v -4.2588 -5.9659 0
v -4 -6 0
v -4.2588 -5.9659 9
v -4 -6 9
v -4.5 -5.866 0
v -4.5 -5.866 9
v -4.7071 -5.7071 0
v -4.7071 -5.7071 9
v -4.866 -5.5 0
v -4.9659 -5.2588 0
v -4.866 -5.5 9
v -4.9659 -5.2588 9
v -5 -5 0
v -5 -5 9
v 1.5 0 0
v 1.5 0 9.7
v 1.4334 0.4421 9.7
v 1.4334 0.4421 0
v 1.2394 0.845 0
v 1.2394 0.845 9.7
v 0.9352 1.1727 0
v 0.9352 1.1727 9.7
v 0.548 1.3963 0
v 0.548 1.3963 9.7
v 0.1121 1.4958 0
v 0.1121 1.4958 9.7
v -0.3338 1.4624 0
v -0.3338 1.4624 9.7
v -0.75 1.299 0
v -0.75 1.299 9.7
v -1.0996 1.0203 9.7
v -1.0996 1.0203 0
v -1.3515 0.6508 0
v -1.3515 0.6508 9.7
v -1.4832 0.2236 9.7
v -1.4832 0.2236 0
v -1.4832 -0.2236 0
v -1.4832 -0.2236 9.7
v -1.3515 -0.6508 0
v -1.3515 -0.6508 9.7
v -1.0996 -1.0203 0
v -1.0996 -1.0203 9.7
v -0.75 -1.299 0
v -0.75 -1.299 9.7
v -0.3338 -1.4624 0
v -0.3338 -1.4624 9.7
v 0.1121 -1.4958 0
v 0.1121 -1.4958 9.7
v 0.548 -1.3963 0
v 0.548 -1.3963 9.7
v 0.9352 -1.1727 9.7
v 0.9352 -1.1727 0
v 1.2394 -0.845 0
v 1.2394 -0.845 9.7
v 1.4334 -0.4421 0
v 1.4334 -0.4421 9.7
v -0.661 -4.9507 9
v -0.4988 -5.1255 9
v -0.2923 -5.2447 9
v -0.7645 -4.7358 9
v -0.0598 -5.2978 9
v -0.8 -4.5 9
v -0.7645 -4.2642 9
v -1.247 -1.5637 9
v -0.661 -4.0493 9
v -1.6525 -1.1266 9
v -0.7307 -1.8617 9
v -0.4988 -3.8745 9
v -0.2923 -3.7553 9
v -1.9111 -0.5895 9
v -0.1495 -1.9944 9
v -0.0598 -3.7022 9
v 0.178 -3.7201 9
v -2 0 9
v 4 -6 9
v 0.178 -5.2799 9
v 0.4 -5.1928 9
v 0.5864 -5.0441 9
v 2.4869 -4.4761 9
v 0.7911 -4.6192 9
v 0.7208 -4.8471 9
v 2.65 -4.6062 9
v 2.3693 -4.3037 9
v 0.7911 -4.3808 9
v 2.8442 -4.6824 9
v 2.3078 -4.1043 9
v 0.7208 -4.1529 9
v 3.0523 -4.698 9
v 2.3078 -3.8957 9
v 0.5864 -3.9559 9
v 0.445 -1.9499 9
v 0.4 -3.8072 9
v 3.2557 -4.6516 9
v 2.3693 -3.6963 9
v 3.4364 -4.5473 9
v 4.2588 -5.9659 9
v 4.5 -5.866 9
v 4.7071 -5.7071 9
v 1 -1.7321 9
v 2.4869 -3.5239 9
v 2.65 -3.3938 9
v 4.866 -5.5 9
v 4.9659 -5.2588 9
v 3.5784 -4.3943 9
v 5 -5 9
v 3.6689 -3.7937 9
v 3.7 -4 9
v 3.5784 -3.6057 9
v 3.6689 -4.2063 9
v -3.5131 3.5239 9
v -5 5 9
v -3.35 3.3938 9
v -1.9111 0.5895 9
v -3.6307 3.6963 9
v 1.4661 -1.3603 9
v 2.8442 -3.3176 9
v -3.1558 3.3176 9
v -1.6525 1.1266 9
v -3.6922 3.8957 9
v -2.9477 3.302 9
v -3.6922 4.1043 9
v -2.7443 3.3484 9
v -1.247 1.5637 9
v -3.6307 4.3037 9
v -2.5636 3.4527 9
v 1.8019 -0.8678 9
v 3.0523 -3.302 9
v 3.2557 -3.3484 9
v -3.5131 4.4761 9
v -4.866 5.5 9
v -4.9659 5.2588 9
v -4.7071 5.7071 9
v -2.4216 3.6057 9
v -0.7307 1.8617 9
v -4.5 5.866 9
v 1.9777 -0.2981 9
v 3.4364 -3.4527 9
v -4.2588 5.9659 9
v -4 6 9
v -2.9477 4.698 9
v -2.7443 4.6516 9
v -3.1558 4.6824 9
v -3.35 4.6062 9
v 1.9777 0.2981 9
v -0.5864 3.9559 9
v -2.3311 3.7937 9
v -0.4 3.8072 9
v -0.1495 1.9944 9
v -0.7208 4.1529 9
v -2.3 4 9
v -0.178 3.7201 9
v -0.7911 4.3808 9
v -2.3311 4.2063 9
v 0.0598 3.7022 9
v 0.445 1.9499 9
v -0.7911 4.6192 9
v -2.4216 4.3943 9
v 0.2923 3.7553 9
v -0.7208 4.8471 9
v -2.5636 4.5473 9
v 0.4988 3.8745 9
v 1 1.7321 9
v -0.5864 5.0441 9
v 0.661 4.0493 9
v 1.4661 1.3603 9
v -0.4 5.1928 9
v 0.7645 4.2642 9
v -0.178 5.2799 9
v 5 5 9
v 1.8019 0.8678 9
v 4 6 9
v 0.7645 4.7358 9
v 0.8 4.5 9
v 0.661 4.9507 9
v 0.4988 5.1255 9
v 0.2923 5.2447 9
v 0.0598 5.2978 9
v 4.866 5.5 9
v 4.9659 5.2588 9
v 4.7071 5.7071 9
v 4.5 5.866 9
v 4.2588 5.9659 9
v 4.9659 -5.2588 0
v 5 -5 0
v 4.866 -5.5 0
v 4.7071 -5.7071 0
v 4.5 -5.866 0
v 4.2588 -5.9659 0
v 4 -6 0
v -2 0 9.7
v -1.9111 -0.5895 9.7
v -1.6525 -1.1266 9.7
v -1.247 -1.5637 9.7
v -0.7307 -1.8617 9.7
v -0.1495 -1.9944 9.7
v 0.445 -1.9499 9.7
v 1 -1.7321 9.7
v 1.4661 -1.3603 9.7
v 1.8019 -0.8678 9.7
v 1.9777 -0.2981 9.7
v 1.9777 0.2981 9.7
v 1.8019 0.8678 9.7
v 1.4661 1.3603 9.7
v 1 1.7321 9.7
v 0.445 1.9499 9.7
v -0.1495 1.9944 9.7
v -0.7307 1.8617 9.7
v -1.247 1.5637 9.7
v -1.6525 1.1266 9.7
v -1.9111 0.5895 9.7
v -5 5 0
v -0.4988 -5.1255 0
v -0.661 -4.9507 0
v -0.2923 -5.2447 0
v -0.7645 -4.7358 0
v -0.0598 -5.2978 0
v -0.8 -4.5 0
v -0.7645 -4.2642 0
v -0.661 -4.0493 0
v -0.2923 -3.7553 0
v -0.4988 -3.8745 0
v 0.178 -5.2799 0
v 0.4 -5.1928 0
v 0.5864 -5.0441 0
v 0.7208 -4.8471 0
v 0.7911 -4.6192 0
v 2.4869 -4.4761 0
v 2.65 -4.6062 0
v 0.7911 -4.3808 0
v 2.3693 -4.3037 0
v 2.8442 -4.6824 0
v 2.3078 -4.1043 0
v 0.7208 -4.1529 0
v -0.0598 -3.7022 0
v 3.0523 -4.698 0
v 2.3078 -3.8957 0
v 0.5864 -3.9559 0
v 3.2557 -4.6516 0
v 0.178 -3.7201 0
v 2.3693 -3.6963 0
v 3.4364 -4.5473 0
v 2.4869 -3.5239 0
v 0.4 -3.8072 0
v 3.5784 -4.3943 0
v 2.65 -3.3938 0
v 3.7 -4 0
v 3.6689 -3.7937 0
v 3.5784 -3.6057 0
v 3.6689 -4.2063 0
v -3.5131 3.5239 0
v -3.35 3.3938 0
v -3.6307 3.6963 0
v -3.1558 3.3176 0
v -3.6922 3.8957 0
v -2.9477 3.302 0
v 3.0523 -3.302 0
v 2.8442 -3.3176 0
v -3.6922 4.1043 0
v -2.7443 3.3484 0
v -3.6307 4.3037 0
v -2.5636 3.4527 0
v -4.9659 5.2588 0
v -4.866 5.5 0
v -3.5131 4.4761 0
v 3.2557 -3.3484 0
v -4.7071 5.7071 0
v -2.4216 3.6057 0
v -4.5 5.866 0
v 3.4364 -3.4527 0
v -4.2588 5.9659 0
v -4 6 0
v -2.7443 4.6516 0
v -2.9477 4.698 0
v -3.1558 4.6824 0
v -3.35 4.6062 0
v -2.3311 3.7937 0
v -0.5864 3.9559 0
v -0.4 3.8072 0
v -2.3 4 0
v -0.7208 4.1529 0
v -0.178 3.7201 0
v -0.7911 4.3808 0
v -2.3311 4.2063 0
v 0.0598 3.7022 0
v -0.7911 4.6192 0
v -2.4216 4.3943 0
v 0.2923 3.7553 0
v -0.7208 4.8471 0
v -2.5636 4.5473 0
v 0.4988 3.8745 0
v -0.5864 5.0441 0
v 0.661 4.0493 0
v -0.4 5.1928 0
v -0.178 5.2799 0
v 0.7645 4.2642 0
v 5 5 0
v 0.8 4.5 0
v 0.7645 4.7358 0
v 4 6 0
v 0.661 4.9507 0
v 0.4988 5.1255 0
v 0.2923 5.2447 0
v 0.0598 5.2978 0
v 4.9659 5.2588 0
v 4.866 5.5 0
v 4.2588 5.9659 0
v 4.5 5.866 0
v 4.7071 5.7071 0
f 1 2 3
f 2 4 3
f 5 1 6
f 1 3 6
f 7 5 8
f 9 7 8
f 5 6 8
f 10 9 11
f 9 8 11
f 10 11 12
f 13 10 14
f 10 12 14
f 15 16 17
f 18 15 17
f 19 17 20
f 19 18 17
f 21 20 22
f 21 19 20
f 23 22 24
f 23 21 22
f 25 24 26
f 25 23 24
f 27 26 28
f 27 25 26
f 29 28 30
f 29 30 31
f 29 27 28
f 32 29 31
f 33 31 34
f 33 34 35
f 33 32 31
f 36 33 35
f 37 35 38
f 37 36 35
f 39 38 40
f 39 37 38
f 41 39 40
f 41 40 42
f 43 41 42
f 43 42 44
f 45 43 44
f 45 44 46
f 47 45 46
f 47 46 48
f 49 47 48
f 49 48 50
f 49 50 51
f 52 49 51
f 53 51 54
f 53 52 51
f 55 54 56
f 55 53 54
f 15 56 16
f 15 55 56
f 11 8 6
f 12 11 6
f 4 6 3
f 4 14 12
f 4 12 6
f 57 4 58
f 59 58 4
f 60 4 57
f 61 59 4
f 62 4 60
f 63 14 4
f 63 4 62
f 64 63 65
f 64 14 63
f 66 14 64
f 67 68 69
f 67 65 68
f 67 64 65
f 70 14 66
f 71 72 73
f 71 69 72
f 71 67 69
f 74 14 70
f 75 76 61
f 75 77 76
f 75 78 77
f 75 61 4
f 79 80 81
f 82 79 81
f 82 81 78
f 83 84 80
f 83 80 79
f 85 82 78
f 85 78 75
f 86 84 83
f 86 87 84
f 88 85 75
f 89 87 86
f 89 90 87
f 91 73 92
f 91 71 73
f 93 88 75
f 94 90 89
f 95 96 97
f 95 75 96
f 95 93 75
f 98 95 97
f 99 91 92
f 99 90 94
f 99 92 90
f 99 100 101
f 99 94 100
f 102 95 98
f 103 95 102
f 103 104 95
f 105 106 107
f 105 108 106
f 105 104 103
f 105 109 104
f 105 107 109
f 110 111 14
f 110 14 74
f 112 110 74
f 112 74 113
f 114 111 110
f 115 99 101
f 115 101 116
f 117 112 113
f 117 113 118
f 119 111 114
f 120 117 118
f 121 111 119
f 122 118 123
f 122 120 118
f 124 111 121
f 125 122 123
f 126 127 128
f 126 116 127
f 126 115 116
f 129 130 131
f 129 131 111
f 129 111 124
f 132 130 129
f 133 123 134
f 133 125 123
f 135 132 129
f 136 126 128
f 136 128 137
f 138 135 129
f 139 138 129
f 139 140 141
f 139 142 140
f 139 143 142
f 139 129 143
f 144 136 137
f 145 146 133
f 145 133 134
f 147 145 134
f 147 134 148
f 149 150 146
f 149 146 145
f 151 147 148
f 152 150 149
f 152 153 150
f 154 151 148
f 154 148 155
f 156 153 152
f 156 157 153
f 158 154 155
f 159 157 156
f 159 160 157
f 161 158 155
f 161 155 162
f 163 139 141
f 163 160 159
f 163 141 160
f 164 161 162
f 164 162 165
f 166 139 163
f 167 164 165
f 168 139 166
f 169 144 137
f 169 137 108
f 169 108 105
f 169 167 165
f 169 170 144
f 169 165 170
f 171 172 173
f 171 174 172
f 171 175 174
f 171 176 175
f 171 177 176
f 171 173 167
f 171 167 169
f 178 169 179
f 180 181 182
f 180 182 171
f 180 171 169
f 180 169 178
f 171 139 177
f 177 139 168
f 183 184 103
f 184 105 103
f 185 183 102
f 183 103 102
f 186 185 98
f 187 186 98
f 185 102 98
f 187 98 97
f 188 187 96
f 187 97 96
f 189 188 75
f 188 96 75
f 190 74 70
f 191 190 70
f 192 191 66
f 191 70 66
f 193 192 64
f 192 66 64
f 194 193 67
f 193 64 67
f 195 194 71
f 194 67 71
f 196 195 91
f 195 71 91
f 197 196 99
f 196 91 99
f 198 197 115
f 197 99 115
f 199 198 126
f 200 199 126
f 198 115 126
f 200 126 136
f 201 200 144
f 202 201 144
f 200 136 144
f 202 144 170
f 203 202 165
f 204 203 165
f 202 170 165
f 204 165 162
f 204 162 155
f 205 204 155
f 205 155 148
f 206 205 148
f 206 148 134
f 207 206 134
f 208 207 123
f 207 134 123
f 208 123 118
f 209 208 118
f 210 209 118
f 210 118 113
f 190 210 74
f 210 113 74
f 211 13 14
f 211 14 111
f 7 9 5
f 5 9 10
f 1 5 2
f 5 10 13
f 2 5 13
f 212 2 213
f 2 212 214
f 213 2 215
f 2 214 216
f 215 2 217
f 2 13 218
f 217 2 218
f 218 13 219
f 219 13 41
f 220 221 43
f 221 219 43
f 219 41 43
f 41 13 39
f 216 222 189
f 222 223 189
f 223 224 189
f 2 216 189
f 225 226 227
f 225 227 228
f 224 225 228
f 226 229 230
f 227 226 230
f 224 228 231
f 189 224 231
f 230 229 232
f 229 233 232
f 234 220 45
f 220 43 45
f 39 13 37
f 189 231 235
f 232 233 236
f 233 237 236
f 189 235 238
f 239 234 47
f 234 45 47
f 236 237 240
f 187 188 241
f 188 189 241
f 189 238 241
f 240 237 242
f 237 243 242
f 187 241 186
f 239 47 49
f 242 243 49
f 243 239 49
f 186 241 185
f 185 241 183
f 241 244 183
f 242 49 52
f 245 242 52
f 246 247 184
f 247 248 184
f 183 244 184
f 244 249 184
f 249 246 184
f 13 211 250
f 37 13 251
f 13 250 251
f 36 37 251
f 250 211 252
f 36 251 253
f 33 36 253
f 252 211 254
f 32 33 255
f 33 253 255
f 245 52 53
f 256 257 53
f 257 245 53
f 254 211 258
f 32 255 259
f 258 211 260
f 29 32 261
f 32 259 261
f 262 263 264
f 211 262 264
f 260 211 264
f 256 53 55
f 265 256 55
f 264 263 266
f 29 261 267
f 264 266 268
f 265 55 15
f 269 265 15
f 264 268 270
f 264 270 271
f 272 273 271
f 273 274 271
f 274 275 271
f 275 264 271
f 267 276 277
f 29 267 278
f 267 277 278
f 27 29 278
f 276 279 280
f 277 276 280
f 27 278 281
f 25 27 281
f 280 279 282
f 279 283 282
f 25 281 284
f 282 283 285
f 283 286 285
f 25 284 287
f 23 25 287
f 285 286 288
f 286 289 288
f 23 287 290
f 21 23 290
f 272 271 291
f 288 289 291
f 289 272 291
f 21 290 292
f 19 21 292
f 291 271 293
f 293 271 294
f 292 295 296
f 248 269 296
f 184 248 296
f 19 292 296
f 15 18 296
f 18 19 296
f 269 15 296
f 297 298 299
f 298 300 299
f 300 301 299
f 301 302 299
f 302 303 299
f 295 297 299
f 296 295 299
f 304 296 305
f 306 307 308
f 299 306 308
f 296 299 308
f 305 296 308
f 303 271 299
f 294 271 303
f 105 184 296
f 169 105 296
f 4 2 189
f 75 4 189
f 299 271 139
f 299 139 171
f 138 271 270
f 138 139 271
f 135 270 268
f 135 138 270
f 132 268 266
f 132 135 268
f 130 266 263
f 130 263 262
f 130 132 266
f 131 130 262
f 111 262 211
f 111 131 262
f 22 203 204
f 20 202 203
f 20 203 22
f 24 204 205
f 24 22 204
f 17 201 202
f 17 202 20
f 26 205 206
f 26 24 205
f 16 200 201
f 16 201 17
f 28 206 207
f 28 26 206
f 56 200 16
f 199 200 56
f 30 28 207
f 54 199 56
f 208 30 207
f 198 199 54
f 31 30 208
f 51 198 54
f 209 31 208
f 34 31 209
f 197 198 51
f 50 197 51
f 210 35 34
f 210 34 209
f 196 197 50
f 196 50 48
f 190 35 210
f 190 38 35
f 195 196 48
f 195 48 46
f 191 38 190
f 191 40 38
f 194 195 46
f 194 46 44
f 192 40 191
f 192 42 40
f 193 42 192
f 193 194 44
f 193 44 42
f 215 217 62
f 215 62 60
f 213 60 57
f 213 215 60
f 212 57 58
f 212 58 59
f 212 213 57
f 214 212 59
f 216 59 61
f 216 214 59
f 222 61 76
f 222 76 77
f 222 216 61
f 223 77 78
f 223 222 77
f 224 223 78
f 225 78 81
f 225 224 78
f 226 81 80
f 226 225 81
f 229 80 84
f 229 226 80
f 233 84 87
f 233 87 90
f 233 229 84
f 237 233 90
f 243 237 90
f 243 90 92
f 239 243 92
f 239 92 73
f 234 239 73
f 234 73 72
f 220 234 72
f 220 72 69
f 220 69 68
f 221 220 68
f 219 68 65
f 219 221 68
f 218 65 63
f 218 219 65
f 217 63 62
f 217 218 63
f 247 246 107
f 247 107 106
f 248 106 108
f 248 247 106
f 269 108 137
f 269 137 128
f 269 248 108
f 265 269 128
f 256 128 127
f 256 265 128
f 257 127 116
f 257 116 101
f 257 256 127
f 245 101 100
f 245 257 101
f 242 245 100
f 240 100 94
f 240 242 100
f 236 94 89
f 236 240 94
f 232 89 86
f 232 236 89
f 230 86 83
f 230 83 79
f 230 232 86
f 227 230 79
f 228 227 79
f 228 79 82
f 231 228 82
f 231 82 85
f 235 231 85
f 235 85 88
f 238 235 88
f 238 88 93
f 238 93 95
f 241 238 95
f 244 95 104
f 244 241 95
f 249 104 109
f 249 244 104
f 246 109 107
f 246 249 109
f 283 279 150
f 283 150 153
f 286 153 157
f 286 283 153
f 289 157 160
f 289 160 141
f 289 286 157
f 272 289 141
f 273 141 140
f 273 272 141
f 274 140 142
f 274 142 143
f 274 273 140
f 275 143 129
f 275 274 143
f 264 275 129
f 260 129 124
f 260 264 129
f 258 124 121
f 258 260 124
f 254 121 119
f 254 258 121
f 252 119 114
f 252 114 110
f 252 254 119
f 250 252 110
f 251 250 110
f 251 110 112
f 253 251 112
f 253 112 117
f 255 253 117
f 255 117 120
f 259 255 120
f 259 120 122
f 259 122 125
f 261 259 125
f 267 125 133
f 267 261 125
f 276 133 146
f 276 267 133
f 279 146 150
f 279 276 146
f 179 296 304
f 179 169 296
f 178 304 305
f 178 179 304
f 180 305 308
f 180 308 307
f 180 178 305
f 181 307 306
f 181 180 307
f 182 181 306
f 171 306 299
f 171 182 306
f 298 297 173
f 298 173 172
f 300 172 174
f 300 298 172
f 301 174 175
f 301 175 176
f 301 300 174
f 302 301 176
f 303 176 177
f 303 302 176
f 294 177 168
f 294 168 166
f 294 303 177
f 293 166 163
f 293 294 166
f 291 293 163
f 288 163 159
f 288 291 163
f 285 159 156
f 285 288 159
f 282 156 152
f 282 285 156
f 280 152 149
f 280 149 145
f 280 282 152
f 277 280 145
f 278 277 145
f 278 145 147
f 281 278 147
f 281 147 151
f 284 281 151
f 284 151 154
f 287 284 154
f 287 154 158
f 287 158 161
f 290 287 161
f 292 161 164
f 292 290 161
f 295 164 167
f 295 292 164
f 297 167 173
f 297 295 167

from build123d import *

# Parameters (mm, degrees)
SKETCH_1_W      = 10
SKETCH_1_H      = 12
SKETCH_1_R      = 1.5
SKETCH_1_R_2    = 0.8
SKETCH_1_R_3    = 0.7
EXTRUDE_1_DEPTH = 9
SKETCH_2_R      = 2
SKETCH_2_R_2    = 1.5
EXTRUDE_2_DEPTH = 0.7
FILLET_1_R      = 1


with BuildPart() as part:
    # 草图1 → 凸台-拉伸1 (new body)
    with BuildSketch(Plane.XY):
        Rectangle(SKETCH_1_W, SKETCH_1_H)
        Circle(SKETCH_1_R, mode=Mode.SUBTRACT)
        with Locations((0, 4.5)):
            Circle(SKETCH_1_R_2, mode=Mode.SUBTRACT)
        with Locations(Location((0, -4.5, 0), (0, 0, 180))):
            Circle(SKETCH_1_R_2, mode=Mode.SUBTRACT)
        with Locations((-3, 4)):
            Circle(SKETCH_1_R_3, mode=Mode.SUBTRACT)
        with Locations((3, -4)):
            Circle(SKETCH_1_R_3, mode=Mode.SUBTRACT)
    extrude(amount=EXTRUDE_1_DEPTH)

    # 草图2 → 凸台-拉伸2 (add)
    with BuildSketch(Plane.XY.offset(9)):
        with Locations(Location((0, 0, 0), (0, 0, 180))):
            Circle(SKETCH_2_R)
        Circle(SKETCH_2_R_2, mode=Mode.SUBTRACT)
    extrude(amount=EXTRUDE_2_DEPTH)

    # 圆角1
    fillet_1_edges = [part.edges().sort_by_distance(p)[0] for p in [
        (5, -6, 4.5),
        (-5, -6, 4.5),
        (-5, 6, 4.5),
        (5, 6, 4.5),
    ]]
    fillet(fillet_1_edges, radius=FILLET_1_R)


solid = part.part
